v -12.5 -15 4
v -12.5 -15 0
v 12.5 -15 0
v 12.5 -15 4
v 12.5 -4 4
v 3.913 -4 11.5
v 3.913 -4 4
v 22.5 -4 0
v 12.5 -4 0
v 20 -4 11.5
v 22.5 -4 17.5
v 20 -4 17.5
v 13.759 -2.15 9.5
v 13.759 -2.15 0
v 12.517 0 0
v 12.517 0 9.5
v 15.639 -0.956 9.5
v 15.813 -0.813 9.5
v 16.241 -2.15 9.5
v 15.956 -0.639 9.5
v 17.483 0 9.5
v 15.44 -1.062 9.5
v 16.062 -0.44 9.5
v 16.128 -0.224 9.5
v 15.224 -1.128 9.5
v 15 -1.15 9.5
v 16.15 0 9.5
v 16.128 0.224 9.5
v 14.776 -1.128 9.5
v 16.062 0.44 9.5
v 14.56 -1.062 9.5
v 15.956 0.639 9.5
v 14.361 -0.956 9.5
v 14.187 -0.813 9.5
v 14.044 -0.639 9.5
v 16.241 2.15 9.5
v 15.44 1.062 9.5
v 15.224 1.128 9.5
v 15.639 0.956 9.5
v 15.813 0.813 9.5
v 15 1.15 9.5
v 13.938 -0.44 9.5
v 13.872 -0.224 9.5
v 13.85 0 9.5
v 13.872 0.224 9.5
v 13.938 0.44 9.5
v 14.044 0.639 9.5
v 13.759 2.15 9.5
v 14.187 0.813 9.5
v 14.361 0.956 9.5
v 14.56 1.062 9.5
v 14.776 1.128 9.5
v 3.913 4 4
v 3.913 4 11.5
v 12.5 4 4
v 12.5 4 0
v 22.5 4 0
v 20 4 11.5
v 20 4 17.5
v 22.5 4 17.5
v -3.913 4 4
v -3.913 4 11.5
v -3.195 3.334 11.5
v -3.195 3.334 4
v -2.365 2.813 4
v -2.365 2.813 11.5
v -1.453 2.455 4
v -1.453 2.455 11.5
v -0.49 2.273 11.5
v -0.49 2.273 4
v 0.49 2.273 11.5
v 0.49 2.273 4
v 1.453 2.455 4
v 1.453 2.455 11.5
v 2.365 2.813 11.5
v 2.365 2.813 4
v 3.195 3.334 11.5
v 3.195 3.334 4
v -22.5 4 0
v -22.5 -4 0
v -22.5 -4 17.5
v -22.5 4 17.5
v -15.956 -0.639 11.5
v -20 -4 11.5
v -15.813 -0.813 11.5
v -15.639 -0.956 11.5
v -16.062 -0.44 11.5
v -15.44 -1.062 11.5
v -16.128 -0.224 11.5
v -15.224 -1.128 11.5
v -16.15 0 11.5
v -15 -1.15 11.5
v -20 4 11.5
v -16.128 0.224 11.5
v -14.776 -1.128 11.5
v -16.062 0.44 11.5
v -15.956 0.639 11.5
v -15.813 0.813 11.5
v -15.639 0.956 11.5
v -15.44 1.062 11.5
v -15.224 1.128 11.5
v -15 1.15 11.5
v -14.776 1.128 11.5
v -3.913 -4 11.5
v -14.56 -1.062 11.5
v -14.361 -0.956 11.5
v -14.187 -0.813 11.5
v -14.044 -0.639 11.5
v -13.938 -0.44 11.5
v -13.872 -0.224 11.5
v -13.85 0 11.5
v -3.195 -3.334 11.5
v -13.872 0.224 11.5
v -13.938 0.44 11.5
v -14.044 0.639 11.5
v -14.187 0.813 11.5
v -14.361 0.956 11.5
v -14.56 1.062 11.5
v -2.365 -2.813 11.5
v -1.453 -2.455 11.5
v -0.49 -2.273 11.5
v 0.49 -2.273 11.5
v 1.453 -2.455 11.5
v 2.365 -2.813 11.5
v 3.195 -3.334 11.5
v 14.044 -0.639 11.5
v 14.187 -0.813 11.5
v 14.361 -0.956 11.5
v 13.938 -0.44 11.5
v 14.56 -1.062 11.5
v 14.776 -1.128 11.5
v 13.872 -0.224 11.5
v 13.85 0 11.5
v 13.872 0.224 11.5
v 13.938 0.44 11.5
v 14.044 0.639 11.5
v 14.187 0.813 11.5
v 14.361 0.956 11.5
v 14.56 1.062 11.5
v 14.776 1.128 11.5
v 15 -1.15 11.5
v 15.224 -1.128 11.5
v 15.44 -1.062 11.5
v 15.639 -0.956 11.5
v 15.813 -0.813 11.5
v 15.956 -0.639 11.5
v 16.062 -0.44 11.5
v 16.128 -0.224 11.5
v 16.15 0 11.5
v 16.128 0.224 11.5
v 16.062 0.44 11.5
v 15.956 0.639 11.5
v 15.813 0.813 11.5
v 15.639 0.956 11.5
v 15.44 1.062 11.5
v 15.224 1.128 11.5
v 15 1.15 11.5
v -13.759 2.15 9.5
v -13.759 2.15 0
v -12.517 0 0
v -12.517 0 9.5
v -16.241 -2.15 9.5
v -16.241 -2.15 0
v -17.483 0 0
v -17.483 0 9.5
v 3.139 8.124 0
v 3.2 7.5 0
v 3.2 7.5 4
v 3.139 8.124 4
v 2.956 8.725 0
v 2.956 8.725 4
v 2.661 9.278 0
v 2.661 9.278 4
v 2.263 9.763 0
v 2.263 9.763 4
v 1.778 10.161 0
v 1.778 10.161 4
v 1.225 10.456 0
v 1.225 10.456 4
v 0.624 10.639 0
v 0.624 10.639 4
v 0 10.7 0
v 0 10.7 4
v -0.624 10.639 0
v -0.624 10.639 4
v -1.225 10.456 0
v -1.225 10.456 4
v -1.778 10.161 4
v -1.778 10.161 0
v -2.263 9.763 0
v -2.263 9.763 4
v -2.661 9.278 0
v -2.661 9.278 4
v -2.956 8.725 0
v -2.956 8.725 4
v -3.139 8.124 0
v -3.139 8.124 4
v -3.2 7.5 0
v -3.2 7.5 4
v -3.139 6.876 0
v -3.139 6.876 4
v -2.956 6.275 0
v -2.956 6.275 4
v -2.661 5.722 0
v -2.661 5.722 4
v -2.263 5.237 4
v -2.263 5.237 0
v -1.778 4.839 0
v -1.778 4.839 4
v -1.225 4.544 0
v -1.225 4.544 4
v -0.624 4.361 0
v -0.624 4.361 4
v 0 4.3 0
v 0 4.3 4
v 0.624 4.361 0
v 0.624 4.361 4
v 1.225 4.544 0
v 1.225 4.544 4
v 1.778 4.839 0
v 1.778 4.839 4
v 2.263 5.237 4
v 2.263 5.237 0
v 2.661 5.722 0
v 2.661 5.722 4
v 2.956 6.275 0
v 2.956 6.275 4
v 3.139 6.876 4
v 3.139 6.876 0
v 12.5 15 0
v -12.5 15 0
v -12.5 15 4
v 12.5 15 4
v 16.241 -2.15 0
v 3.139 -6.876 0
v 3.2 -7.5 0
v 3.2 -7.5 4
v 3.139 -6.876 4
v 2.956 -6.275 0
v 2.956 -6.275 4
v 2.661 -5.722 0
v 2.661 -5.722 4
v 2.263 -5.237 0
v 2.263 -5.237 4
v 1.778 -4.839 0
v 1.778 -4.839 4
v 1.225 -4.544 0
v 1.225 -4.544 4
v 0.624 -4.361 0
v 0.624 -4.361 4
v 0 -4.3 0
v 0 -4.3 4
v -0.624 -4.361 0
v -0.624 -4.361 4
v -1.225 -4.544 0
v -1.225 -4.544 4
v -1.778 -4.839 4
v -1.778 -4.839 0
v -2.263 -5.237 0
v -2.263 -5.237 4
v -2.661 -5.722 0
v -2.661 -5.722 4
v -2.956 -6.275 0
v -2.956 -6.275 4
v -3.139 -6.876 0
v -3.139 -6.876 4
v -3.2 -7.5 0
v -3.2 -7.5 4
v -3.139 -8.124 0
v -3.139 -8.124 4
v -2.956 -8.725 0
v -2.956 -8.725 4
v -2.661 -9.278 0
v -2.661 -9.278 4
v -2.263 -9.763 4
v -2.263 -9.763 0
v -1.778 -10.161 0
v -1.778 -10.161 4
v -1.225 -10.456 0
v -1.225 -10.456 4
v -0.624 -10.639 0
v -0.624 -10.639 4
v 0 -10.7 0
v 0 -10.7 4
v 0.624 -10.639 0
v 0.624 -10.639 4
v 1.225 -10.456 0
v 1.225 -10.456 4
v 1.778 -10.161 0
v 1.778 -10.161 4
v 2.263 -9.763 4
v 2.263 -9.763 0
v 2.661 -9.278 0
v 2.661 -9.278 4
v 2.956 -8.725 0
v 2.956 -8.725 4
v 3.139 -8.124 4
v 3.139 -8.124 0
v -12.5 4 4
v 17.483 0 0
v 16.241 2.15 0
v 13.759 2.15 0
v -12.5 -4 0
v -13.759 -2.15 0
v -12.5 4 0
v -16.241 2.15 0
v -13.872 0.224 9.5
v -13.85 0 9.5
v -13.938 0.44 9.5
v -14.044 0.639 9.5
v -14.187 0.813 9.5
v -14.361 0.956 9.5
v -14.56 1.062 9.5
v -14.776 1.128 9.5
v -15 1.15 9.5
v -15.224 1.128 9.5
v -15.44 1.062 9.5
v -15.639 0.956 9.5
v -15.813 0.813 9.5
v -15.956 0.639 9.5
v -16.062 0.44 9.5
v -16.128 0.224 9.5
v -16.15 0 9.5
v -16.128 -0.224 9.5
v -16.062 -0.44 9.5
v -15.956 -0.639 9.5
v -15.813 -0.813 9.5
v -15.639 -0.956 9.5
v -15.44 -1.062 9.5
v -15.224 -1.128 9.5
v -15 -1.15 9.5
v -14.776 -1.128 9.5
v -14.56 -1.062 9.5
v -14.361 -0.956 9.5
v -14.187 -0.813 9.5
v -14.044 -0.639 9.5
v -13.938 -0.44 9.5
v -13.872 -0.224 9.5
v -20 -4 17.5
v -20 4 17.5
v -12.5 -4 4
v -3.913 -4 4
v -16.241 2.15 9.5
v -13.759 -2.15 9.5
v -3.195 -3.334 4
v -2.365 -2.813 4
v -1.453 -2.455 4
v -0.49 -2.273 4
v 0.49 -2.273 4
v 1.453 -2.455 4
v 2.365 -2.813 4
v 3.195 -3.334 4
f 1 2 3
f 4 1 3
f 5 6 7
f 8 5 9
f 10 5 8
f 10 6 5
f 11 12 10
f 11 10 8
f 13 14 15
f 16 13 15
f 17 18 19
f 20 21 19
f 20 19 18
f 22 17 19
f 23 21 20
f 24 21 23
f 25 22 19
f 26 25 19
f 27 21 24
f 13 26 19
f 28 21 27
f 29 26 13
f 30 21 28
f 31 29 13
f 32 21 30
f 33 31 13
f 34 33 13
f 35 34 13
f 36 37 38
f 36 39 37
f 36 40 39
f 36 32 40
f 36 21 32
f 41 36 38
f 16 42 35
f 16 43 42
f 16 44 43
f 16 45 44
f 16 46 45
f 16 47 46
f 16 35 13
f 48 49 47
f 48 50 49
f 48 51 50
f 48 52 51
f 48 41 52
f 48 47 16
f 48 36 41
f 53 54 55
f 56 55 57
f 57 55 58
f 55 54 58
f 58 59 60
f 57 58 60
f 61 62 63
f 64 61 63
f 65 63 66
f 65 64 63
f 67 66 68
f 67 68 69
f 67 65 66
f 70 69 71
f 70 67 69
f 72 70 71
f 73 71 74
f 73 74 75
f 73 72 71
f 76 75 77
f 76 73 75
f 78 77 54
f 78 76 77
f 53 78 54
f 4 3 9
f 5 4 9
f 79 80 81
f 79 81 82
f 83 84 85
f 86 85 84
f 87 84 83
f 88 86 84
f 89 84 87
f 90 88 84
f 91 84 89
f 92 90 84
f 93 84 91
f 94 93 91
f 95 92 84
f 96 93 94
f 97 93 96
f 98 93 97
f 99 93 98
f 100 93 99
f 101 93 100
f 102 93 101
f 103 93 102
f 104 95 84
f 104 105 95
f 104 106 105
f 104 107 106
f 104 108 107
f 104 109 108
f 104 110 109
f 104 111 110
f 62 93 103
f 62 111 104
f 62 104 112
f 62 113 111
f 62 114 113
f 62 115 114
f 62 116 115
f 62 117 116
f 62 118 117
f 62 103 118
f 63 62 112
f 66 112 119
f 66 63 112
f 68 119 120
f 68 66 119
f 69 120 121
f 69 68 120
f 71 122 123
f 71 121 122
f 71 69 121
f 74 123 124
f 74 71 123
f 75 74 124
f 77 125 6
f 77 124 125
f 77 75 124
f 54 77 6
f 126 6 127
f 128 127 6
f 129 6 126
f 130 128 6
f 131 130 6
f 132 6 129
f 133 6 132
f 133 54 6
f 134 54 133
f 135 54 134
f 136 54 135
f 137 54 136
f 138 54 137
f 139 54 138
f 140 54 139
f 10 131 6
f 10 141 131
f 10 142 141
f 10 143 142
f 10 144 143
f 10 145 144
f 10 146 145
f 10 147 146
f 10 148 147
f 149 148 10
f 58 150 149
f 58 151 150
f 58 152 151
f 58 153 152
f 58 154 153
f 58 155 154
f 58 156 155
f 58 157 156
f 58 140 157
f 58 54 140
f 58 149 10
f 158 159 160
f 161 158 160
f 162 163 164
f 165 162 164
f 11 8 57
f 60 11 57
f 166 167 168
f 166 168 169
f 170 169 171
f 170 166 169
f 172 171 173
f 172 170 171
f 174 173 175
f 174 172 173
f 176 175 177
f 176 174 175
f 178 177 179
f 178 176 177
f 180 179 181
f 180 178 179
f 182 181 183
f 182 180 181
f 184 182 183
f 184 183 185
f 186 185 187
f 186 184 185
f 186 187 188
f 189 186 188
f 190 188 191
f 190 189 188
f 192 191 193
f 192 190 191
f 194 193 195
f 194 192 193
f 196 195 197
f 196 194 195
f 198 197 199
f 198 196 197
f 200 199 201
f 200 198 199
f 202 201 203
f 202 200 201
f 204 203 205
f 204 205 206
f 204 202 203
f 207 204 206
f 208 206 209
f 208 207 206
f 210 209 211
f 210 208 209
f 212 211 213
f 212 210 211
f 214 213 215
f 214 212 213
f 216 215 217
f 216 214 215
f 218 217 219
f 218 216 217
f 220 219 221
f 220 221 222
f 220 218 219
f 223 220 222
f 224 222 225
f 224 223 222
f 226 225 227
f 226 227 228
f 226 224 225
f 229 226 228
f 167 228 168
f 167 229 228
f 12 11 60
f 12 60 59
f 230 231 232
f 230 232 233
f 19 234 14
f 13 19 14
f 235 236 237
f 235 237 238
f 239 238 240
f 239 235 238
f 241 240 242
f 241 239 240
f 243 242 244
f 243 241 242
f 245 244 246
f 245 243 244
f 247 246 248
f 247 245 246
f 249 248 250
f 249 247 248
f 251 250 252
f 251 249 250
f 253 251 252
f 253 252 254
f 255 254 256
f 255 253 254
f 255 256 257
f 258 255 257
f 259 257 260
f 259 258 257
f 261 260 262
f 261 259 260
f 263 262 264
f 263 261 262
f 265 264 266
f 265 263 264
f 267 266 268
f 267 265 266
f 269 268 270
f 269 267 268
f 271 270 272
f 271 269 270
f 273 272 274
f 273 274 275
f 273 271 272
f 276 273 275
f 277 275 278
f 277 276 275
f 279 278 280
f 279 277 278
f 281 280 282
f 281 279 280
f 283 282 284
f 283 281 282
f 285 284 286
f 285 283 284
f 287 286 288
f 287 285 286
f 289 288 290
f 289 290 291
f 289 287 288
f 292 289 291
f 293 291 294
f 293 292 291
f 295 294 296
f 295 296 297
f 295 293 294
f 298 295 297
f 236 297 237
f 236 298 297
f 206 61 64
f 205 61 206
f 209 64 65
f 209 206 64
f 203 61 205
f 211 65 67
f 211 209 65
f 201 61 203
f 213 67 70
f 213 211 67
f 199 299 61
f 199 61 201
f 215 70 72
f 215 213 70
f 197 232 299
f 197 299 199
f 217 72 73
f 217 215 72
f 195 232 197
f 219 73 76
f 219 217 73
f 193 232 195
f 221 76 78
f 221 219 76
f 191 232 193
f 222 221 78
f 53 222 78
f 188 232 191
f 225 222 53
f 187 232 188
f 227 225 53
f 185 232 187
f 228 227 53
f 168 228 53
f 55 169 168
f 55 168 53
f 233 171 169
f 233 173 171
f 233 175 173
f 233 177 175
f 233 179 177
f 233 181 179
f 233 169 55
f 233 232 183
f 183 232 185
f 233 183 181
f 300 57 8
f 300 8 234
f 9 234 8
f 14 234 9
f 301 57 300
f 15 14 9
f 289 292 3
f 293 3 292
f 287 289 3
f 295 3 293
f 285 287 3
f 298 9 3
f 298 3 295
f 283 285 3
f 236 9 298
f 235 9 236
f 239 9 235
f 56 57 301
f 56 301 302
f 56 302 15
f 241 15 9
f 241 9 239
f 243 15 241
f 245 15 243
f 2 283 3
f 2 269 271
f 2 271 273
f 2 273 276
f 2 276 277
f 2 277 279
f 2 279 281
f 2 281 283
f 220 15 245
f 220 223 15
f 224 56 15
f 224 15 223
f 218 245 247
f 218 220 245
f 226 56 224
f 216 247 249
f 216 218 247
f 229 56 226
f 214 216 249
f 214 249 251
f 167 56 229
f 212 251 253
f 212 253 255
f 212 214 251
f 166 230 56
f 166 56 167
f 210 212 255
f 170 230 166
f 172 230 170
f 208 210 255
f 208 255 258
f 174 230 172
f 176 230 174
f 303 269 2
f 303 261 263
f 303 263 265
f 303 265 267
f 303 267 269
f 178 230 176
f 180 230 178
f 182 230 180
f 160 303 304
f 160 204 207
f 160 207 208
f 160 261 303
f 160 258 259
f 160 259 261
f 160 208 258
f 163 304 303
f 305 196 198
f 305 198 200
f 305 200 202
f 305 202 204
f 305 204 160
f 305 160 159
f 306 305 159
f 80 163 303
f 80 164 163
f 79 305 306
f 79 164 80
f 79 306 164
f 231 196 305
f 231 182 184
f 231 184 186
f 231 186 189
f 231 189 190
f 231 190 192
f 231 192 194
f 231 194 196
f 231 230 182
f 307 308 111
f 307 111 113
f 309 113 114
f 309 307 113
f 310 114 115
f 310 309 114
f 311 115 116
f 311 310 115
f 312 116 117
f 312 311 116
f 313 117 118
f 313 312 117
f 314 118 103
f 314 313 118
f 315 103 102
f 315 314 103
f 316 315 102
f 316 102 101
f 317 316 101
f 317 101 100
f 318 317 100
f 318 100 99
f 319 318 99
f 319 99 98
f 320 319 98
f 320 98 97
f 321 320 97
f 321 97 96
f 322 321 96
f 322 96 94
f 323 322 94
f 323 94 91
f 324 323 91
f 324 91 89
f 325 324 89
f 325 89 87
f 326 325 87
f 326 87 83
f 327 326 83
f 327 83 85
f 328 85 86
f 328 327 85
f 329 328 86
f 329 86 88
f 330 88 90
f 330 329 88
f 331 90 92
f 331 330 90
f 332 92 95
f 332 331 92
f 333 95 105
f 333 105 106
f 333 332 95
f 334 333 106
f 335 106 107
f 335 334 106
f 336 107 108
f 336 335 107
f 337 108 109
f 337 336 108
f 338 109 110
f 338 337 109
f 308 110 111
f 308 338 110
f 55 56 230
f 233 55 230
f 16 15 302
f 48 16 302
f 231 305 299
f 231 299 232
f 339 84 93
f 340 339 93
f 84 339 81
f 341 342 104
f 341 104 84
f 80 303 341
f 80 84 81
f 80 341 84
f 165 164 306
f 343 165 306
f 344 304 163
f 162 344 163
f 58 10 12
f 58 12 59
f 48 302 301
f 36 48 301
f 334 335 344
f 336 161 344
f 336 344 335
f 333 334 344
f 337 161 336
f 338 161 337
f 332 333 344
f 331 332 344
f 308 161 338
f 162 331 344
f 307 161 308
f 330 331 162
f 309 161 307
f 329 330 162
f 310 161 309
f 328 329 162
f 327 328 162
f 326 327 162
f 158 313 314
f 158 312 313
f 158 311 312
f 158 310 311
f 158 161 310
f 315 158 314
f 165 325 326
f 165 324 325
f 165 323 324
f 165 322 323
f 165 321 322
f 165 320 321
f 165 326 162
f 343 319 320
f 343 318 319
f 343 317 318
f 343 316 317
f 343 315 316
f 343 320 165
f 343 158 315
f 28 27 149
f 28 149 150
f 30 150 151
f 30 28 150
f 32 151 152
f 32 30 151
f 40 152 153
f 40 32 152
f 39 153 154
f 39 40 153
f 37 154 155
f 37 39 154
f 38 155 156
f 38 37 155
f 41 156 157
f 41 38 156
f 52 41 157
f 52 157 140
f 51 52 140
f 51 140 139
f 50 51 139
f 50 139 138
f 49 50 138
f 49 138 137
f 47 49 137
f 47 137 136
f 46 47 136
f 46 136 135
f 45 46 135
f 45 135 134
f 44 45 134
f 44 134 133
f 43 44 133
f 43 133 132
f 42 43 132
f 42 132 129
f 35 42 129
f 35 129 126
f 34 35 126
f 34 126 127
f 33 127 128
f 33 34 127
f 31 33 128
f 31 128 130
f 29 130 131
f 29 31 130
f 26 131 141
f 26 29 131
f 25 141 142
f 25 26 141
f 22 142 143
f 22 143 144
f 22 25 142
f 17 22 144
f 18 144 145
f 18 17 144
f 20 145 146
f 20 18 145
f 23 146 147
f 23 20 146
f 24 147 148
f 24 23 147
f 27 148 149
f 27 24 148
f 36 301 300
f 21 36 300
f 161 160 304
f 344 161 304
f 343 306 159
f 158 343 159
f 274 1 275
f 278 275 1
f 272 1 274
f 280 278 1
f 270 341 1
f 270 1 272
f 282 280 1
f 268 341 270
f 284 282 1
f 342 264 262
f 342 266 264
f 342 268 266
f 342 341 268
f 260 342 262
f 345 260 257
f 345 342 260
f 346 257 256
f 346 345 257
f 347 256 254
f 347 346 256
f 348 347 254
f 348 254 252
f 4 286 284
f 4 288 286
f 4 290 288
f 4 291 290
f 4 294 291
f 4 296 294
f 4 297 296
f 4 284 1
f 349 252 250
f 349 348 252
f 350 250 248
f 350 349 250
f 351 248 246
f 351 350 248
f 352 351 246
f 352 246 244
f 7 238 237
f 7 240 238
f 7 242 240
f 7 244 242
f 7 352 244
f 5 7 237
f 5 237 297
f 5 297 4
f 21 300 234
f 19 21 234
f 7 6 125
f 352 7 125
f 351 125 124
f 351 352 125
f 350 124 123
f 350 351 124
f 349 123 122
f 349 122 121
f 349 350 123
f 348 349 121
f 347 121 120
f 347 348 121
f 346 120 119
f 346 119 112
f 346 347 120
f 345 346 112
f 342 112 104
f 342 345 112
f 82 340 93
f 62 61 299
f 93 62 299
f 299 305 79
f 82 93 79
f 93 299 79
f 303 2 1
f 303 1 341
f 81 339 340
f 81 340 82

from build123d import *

# Parameters (mm, degrees)
SKETCH_1_W           = 25
SKETCH_1_H           = 30
SKETCH_1_R           = 3.2
EXTRUDE_1_DEPTH      = 4
SKETCH_2_W           = 40
SKETCH_2_H           = 8
SKETCH_2_R           = 1.15
EXTRUDE_2_DEPTH      = 7.5
EXTRUDE_2_DEPTH_BACK = 4
CUT_EXTRUDE_2_DEPTH  = 9.5
SKETCH_5_R           = 5.25
CUT_EXTRUDE_3_DEPTH  = 7.5
SKETCH_6_W           = 2.5
SKETCH_6_H           = 8
EXTRUDE_3_DEPTH      = 17.5


with BuildPart() as part:
    # 스케치1 → 보스-돌출1 (new body)
    with BuildSketch(Plane.XY):
        Rectangle(SKETCH_1_W, SKETCH_1_H)
        with Locations((0, 7.5)):
            Circle(SKETCH_1_R, mode=Mode.SUBTRACT)
        with Locations((0, -7.5)):
            Circle(SKETCH_1_R, mode=Mode.SUBTRACT)
    extrude(amount=EXTRUDE_1_DEPTH)

    # 스케치2 → 보스-돌출2 (add, two sides)
    with BuildSketch(Plane.XY.offset(4)) as extrude_2_sk:
        Rectangle(SKETCH_2_W, SKETCH_2_H)
        with Locations((15, 0)):
            Circle(SKETCH_2_R, mode=Mode.SUBTRACT)
        with Locations((-15, 0)):
            Circle(SKETCH_2_R, mode=Mode.SUBTRACT)
    extrude(amount=EXTRUDE_2_DEPTH)
    extrude(extrude_2_sk.sketch, amount=-EXTRUDE_2_DEPTH_BACK)

    # 스케치4 → 컷-돌출2 (cut)
    with BuildSketch(Plane(origin=(0, 0, 0), x_dir=(-1, 0, 0), z_dir=(0, 0, -1))):
        Polygon((17.482606158, 0), (16.241303079, 2.15), (13.758696921, 2.15), (12.517393842, 0), (13.758696921, -2.15), (16.241303079, -2.15), align=None)
        Polygon((-12.517393842, 0), (-13.758696921, 2.15), (-16.241303079, 2.15), (-17.482606158, 0), (-16.241303079, -2.15), (-13.758696921, -2.15), align=None)
    extrude(amount=-CUT_EXTRUDE_2_DEPTH, mode=Mode.SUBTRACT)

    # 스케치5 → 컷-돌출3 (cut)
    with BuildSketch(Plane.XY.offset(4)):
        with Locations((0, 7.5)):
            Circle(SKETCH_5_R)
        with Locations((0, -7.5)):
            Circle(SKETCH_5_R)
    extrude(amount=CUT_EXTRUDE_3_DEPTH, mode=Mode.SUBTRACT)

    # 스케치6 → 보스-돌출3 (add)
    with BuildSketch(Plane(origin=(0, 0, 0), x_dir=(-1, 0, 0), z_dir=(0, 0, -1))):
        with Locations((21.25, 0)):
            Rectangle(SKETCH_6_W, SKETCH_6_H)
        with Locations((-21.25, 0)):
            Rectangle(SKETCH_6_W, SKETCH_6_H)
    extrude(amount=-EXTRUDE_3_DEPTH)


solid = part.part
